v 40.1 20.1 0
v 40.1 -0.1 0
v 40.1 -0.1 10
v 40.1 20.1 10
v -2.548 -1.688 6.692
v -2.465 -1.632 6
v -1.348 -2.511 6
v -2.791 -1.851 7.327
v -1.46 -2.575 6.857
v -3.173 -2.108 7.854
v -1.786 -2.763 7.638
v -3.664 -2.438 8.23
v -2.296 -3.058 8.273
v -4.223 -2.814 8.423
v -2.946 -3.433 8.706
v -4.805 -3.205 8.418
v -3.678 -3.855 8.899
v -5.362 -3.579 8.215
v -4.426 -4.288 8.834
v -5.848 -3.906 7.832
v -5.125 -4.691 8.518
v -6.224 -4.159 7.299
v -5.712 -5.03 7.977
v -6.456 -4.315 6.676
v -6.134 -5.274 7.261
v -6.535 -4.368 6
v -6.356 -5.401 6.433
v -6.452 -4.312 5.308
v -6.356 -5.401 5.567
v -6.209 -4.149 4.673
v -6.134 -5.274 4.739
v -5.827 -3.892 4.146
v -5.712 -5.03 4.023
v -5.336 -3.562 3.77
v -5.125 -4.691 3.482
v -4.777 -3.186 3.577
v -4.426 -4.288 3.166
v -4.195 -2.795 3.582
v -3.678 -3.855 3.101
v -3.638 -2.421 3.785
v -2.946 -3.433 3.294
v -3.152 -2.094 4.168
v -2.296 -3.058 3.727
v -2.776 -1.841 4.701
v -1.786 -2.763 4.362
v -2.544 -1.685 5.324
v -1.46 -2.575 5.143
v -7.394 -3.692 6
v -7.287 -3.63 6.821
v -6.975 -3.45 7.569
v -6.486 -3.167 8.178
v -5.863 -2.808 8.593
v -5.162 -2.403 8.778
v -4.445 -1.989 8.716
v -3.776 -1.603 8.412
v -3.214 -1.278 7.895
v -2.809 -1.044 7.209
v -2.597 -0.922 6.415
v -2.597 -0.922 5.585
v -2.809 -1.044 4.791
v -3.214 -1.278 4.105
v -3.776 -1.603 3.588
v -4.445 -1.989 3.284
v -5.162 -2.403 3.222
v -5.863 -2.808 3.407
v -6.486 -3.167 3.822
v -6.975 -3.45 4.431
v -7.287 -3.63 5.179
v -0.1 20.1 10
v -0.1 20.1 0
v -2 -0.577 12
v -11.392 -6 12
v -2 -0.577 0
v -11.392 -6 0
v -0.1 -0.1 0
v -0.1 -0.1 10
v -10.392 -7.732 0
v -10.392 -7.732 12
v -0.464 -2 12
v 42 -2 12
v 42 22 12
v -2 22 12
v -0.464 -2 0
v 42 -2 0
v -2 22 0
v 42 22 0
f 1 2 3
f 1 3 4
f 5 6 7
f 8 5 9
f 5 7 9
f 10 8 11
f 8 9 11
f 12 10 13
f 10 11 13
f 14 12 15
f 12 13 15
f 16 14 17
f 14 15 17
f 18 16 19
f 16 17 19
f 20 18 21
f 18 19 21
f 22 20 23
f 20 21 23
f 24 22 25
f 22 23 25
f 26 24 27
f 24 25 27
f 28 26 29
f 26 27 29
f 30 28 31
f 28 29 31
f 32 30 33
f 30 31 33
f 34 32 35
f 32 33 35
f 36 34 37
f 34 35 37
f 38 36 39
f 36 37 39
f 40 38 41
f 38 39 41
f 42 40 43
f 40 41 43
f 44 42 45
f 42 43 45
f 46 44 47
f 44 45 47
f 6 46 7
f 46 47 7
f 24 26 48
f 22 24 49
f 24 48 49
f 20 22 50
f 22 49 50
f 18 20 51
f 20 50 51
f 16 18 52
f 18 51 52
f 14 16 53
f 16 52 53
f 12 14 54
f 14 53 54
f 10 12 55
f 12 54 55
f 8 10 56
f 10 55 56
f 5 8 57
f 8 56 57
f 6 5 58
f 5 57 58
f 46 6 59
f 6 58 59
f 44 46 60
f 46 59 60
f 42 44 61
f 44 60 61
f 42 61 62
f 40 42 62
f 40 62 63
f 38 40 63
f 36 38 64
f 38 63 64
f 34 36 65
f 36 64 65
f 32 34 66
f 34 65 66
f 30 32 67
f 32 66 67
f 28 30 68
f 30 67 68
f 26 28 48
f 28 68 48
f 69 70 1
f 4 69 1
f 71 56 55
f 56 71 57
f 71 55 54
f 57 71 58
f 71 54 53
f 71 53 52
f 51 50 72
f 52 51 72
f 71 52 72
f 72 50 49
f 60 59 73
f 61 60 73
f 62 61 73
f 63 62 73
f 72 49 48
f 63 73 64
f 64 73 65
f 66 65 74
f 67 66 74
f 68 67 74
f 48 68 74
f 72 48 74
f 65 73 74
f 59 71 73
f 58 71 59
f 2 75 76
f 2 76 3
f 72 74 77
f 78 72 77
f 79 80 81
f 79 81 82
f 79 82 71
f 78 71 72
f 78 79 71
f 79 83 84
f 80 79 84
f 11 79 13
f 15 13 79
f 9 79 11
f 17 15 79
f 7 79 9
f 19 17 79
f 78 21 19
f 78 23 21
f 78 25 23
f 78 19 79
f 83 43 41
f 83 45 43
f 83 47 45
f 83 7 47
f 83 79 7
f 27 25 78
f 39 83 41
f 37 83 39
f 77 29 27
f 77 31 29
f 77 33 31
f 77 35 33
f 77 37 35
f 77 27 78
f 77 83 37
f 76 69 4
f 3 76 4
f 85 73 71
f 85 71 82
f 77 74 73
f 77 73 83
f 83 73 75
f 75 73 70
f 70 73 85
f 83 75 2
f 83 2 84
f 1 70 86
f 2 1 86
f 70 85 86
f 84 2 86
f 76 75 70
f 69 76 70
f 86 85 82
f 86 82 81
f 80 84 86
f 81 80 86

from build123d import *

# Parameters (mm, degrees)
SKETCH001_W  = 44
SKETCH001_H  = 24
PAD_DEPTH    = 12
BOX_W        = 12
BOX_H        = 2
BOX_DEPTH    = 12
BOX001_W     = 40.2
BOX001_H     = 20.2
BOX001_DEPTH = 10


with BuildPart() as part:
    # Sketch001 → Pad (new body)
    with BuildSketch(Plane.XY):
        with Locations((20, 10)):
            Rectangle(SKETCH001_W, SKETCH001_H)
    extrude(amount=PAD_DEPTH)

    # Box → Box (join)
    with BuildSketch(Plane(origin=(-1, 0, 0), x_dir=(-0.866025, -0.5, 0), z_dir=(0, 0, 1))):
        with Locations((6, 1)):
            Rectangle(BOX_W, BOX_H)
    extrude(amount=BOX_DEPTH)

    # Box001 → Box001 (cut)
    with BuildSketch(Plane(origin=(-0.1, -0.1, 0), x_dir=(1, 0, 0), z_dir=(0, 0, 1))):
        with Locations((20.1, 10.1)):
            Rectangle(BOX001_W, BOX001_H)
    extrude(amount=BOX001_DEPTH, mode=Mode.SUBTRACT)

    # Cone → Cone (revolve, cut)
    with BuildSketch(Plane(origin=(-5, -2, 6), x_dir=(0.866025, 0.5, 0), z_dir=(0, 0, -1))):
        Polygon((0, 0), (2, 0), (3, 2.5), (0, 2.5), align=None)
    revolve(axis=Axis((-5, -2, 6), (0.5, -0.866025, 0)), mode=Mode.SUBTRACT)

    # Cone001 → Cone001 (revolve, cut)
    with BuildSketch(Plane(origin=(-4, -4, 6), x_dir=(-0.866025, -0.5, 0), z_dir=(0, 0, -1))):
        Polygon((0, 0), (2, 0), (3, 2.5), (0, 2.5), align=None)
    revolve(axis=Axis((-4, -4, 6), (-0.5, 0.866025, 0)), mode=Mode.SUBTRACT)


solid = part.part
